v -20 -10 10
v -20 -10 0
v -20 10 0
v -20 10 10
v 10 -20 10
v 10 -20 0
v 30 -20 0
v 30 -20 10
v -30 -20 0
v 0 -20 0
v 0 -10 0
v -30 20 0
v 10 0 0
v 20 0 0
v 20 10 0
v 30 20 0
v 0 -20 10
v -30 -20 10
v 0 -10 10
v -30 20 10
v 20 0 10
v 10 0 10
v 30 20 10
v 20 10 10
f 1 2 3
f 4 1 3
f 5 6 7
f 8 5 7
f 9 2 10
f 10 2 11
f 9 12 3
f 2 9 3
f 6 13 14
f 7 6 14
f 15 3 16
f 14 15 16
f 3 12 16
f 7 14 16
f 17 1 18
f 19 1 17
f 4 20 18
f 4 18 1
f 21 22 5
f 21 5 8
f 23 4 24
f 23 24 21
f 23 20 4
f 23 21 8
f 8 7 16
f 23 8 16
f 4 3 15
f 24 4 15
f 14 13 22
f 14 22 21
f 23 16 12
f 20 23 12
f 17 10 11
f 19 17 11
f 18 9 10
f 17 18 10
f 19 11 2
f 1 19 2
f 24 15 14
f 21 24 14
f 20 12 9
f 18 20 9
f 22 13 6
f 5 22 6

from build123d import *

# Parameters (mm, degrees)
F0_W     = 10
F0_H     = 10
F1_DEPTH = 10


with BuildPart() as f1:
    # F0 (on Top) → F1 (new body)
    with BuildSketch(Plane.XY):
        Polygon((30, 20), (-30, 20), (-30, -20), (0, -20), (0, -10), (-20, -10), (-20, 10), (20, 10), (20, 0), (20, -10), (10, -10), (10, -20), (30, -20), align=None)
        with Locations((15, -5)):
            Rectangle(F0_W, F0_H)
    extrude(amount=F1_DEPTH)


solid = f1.part
